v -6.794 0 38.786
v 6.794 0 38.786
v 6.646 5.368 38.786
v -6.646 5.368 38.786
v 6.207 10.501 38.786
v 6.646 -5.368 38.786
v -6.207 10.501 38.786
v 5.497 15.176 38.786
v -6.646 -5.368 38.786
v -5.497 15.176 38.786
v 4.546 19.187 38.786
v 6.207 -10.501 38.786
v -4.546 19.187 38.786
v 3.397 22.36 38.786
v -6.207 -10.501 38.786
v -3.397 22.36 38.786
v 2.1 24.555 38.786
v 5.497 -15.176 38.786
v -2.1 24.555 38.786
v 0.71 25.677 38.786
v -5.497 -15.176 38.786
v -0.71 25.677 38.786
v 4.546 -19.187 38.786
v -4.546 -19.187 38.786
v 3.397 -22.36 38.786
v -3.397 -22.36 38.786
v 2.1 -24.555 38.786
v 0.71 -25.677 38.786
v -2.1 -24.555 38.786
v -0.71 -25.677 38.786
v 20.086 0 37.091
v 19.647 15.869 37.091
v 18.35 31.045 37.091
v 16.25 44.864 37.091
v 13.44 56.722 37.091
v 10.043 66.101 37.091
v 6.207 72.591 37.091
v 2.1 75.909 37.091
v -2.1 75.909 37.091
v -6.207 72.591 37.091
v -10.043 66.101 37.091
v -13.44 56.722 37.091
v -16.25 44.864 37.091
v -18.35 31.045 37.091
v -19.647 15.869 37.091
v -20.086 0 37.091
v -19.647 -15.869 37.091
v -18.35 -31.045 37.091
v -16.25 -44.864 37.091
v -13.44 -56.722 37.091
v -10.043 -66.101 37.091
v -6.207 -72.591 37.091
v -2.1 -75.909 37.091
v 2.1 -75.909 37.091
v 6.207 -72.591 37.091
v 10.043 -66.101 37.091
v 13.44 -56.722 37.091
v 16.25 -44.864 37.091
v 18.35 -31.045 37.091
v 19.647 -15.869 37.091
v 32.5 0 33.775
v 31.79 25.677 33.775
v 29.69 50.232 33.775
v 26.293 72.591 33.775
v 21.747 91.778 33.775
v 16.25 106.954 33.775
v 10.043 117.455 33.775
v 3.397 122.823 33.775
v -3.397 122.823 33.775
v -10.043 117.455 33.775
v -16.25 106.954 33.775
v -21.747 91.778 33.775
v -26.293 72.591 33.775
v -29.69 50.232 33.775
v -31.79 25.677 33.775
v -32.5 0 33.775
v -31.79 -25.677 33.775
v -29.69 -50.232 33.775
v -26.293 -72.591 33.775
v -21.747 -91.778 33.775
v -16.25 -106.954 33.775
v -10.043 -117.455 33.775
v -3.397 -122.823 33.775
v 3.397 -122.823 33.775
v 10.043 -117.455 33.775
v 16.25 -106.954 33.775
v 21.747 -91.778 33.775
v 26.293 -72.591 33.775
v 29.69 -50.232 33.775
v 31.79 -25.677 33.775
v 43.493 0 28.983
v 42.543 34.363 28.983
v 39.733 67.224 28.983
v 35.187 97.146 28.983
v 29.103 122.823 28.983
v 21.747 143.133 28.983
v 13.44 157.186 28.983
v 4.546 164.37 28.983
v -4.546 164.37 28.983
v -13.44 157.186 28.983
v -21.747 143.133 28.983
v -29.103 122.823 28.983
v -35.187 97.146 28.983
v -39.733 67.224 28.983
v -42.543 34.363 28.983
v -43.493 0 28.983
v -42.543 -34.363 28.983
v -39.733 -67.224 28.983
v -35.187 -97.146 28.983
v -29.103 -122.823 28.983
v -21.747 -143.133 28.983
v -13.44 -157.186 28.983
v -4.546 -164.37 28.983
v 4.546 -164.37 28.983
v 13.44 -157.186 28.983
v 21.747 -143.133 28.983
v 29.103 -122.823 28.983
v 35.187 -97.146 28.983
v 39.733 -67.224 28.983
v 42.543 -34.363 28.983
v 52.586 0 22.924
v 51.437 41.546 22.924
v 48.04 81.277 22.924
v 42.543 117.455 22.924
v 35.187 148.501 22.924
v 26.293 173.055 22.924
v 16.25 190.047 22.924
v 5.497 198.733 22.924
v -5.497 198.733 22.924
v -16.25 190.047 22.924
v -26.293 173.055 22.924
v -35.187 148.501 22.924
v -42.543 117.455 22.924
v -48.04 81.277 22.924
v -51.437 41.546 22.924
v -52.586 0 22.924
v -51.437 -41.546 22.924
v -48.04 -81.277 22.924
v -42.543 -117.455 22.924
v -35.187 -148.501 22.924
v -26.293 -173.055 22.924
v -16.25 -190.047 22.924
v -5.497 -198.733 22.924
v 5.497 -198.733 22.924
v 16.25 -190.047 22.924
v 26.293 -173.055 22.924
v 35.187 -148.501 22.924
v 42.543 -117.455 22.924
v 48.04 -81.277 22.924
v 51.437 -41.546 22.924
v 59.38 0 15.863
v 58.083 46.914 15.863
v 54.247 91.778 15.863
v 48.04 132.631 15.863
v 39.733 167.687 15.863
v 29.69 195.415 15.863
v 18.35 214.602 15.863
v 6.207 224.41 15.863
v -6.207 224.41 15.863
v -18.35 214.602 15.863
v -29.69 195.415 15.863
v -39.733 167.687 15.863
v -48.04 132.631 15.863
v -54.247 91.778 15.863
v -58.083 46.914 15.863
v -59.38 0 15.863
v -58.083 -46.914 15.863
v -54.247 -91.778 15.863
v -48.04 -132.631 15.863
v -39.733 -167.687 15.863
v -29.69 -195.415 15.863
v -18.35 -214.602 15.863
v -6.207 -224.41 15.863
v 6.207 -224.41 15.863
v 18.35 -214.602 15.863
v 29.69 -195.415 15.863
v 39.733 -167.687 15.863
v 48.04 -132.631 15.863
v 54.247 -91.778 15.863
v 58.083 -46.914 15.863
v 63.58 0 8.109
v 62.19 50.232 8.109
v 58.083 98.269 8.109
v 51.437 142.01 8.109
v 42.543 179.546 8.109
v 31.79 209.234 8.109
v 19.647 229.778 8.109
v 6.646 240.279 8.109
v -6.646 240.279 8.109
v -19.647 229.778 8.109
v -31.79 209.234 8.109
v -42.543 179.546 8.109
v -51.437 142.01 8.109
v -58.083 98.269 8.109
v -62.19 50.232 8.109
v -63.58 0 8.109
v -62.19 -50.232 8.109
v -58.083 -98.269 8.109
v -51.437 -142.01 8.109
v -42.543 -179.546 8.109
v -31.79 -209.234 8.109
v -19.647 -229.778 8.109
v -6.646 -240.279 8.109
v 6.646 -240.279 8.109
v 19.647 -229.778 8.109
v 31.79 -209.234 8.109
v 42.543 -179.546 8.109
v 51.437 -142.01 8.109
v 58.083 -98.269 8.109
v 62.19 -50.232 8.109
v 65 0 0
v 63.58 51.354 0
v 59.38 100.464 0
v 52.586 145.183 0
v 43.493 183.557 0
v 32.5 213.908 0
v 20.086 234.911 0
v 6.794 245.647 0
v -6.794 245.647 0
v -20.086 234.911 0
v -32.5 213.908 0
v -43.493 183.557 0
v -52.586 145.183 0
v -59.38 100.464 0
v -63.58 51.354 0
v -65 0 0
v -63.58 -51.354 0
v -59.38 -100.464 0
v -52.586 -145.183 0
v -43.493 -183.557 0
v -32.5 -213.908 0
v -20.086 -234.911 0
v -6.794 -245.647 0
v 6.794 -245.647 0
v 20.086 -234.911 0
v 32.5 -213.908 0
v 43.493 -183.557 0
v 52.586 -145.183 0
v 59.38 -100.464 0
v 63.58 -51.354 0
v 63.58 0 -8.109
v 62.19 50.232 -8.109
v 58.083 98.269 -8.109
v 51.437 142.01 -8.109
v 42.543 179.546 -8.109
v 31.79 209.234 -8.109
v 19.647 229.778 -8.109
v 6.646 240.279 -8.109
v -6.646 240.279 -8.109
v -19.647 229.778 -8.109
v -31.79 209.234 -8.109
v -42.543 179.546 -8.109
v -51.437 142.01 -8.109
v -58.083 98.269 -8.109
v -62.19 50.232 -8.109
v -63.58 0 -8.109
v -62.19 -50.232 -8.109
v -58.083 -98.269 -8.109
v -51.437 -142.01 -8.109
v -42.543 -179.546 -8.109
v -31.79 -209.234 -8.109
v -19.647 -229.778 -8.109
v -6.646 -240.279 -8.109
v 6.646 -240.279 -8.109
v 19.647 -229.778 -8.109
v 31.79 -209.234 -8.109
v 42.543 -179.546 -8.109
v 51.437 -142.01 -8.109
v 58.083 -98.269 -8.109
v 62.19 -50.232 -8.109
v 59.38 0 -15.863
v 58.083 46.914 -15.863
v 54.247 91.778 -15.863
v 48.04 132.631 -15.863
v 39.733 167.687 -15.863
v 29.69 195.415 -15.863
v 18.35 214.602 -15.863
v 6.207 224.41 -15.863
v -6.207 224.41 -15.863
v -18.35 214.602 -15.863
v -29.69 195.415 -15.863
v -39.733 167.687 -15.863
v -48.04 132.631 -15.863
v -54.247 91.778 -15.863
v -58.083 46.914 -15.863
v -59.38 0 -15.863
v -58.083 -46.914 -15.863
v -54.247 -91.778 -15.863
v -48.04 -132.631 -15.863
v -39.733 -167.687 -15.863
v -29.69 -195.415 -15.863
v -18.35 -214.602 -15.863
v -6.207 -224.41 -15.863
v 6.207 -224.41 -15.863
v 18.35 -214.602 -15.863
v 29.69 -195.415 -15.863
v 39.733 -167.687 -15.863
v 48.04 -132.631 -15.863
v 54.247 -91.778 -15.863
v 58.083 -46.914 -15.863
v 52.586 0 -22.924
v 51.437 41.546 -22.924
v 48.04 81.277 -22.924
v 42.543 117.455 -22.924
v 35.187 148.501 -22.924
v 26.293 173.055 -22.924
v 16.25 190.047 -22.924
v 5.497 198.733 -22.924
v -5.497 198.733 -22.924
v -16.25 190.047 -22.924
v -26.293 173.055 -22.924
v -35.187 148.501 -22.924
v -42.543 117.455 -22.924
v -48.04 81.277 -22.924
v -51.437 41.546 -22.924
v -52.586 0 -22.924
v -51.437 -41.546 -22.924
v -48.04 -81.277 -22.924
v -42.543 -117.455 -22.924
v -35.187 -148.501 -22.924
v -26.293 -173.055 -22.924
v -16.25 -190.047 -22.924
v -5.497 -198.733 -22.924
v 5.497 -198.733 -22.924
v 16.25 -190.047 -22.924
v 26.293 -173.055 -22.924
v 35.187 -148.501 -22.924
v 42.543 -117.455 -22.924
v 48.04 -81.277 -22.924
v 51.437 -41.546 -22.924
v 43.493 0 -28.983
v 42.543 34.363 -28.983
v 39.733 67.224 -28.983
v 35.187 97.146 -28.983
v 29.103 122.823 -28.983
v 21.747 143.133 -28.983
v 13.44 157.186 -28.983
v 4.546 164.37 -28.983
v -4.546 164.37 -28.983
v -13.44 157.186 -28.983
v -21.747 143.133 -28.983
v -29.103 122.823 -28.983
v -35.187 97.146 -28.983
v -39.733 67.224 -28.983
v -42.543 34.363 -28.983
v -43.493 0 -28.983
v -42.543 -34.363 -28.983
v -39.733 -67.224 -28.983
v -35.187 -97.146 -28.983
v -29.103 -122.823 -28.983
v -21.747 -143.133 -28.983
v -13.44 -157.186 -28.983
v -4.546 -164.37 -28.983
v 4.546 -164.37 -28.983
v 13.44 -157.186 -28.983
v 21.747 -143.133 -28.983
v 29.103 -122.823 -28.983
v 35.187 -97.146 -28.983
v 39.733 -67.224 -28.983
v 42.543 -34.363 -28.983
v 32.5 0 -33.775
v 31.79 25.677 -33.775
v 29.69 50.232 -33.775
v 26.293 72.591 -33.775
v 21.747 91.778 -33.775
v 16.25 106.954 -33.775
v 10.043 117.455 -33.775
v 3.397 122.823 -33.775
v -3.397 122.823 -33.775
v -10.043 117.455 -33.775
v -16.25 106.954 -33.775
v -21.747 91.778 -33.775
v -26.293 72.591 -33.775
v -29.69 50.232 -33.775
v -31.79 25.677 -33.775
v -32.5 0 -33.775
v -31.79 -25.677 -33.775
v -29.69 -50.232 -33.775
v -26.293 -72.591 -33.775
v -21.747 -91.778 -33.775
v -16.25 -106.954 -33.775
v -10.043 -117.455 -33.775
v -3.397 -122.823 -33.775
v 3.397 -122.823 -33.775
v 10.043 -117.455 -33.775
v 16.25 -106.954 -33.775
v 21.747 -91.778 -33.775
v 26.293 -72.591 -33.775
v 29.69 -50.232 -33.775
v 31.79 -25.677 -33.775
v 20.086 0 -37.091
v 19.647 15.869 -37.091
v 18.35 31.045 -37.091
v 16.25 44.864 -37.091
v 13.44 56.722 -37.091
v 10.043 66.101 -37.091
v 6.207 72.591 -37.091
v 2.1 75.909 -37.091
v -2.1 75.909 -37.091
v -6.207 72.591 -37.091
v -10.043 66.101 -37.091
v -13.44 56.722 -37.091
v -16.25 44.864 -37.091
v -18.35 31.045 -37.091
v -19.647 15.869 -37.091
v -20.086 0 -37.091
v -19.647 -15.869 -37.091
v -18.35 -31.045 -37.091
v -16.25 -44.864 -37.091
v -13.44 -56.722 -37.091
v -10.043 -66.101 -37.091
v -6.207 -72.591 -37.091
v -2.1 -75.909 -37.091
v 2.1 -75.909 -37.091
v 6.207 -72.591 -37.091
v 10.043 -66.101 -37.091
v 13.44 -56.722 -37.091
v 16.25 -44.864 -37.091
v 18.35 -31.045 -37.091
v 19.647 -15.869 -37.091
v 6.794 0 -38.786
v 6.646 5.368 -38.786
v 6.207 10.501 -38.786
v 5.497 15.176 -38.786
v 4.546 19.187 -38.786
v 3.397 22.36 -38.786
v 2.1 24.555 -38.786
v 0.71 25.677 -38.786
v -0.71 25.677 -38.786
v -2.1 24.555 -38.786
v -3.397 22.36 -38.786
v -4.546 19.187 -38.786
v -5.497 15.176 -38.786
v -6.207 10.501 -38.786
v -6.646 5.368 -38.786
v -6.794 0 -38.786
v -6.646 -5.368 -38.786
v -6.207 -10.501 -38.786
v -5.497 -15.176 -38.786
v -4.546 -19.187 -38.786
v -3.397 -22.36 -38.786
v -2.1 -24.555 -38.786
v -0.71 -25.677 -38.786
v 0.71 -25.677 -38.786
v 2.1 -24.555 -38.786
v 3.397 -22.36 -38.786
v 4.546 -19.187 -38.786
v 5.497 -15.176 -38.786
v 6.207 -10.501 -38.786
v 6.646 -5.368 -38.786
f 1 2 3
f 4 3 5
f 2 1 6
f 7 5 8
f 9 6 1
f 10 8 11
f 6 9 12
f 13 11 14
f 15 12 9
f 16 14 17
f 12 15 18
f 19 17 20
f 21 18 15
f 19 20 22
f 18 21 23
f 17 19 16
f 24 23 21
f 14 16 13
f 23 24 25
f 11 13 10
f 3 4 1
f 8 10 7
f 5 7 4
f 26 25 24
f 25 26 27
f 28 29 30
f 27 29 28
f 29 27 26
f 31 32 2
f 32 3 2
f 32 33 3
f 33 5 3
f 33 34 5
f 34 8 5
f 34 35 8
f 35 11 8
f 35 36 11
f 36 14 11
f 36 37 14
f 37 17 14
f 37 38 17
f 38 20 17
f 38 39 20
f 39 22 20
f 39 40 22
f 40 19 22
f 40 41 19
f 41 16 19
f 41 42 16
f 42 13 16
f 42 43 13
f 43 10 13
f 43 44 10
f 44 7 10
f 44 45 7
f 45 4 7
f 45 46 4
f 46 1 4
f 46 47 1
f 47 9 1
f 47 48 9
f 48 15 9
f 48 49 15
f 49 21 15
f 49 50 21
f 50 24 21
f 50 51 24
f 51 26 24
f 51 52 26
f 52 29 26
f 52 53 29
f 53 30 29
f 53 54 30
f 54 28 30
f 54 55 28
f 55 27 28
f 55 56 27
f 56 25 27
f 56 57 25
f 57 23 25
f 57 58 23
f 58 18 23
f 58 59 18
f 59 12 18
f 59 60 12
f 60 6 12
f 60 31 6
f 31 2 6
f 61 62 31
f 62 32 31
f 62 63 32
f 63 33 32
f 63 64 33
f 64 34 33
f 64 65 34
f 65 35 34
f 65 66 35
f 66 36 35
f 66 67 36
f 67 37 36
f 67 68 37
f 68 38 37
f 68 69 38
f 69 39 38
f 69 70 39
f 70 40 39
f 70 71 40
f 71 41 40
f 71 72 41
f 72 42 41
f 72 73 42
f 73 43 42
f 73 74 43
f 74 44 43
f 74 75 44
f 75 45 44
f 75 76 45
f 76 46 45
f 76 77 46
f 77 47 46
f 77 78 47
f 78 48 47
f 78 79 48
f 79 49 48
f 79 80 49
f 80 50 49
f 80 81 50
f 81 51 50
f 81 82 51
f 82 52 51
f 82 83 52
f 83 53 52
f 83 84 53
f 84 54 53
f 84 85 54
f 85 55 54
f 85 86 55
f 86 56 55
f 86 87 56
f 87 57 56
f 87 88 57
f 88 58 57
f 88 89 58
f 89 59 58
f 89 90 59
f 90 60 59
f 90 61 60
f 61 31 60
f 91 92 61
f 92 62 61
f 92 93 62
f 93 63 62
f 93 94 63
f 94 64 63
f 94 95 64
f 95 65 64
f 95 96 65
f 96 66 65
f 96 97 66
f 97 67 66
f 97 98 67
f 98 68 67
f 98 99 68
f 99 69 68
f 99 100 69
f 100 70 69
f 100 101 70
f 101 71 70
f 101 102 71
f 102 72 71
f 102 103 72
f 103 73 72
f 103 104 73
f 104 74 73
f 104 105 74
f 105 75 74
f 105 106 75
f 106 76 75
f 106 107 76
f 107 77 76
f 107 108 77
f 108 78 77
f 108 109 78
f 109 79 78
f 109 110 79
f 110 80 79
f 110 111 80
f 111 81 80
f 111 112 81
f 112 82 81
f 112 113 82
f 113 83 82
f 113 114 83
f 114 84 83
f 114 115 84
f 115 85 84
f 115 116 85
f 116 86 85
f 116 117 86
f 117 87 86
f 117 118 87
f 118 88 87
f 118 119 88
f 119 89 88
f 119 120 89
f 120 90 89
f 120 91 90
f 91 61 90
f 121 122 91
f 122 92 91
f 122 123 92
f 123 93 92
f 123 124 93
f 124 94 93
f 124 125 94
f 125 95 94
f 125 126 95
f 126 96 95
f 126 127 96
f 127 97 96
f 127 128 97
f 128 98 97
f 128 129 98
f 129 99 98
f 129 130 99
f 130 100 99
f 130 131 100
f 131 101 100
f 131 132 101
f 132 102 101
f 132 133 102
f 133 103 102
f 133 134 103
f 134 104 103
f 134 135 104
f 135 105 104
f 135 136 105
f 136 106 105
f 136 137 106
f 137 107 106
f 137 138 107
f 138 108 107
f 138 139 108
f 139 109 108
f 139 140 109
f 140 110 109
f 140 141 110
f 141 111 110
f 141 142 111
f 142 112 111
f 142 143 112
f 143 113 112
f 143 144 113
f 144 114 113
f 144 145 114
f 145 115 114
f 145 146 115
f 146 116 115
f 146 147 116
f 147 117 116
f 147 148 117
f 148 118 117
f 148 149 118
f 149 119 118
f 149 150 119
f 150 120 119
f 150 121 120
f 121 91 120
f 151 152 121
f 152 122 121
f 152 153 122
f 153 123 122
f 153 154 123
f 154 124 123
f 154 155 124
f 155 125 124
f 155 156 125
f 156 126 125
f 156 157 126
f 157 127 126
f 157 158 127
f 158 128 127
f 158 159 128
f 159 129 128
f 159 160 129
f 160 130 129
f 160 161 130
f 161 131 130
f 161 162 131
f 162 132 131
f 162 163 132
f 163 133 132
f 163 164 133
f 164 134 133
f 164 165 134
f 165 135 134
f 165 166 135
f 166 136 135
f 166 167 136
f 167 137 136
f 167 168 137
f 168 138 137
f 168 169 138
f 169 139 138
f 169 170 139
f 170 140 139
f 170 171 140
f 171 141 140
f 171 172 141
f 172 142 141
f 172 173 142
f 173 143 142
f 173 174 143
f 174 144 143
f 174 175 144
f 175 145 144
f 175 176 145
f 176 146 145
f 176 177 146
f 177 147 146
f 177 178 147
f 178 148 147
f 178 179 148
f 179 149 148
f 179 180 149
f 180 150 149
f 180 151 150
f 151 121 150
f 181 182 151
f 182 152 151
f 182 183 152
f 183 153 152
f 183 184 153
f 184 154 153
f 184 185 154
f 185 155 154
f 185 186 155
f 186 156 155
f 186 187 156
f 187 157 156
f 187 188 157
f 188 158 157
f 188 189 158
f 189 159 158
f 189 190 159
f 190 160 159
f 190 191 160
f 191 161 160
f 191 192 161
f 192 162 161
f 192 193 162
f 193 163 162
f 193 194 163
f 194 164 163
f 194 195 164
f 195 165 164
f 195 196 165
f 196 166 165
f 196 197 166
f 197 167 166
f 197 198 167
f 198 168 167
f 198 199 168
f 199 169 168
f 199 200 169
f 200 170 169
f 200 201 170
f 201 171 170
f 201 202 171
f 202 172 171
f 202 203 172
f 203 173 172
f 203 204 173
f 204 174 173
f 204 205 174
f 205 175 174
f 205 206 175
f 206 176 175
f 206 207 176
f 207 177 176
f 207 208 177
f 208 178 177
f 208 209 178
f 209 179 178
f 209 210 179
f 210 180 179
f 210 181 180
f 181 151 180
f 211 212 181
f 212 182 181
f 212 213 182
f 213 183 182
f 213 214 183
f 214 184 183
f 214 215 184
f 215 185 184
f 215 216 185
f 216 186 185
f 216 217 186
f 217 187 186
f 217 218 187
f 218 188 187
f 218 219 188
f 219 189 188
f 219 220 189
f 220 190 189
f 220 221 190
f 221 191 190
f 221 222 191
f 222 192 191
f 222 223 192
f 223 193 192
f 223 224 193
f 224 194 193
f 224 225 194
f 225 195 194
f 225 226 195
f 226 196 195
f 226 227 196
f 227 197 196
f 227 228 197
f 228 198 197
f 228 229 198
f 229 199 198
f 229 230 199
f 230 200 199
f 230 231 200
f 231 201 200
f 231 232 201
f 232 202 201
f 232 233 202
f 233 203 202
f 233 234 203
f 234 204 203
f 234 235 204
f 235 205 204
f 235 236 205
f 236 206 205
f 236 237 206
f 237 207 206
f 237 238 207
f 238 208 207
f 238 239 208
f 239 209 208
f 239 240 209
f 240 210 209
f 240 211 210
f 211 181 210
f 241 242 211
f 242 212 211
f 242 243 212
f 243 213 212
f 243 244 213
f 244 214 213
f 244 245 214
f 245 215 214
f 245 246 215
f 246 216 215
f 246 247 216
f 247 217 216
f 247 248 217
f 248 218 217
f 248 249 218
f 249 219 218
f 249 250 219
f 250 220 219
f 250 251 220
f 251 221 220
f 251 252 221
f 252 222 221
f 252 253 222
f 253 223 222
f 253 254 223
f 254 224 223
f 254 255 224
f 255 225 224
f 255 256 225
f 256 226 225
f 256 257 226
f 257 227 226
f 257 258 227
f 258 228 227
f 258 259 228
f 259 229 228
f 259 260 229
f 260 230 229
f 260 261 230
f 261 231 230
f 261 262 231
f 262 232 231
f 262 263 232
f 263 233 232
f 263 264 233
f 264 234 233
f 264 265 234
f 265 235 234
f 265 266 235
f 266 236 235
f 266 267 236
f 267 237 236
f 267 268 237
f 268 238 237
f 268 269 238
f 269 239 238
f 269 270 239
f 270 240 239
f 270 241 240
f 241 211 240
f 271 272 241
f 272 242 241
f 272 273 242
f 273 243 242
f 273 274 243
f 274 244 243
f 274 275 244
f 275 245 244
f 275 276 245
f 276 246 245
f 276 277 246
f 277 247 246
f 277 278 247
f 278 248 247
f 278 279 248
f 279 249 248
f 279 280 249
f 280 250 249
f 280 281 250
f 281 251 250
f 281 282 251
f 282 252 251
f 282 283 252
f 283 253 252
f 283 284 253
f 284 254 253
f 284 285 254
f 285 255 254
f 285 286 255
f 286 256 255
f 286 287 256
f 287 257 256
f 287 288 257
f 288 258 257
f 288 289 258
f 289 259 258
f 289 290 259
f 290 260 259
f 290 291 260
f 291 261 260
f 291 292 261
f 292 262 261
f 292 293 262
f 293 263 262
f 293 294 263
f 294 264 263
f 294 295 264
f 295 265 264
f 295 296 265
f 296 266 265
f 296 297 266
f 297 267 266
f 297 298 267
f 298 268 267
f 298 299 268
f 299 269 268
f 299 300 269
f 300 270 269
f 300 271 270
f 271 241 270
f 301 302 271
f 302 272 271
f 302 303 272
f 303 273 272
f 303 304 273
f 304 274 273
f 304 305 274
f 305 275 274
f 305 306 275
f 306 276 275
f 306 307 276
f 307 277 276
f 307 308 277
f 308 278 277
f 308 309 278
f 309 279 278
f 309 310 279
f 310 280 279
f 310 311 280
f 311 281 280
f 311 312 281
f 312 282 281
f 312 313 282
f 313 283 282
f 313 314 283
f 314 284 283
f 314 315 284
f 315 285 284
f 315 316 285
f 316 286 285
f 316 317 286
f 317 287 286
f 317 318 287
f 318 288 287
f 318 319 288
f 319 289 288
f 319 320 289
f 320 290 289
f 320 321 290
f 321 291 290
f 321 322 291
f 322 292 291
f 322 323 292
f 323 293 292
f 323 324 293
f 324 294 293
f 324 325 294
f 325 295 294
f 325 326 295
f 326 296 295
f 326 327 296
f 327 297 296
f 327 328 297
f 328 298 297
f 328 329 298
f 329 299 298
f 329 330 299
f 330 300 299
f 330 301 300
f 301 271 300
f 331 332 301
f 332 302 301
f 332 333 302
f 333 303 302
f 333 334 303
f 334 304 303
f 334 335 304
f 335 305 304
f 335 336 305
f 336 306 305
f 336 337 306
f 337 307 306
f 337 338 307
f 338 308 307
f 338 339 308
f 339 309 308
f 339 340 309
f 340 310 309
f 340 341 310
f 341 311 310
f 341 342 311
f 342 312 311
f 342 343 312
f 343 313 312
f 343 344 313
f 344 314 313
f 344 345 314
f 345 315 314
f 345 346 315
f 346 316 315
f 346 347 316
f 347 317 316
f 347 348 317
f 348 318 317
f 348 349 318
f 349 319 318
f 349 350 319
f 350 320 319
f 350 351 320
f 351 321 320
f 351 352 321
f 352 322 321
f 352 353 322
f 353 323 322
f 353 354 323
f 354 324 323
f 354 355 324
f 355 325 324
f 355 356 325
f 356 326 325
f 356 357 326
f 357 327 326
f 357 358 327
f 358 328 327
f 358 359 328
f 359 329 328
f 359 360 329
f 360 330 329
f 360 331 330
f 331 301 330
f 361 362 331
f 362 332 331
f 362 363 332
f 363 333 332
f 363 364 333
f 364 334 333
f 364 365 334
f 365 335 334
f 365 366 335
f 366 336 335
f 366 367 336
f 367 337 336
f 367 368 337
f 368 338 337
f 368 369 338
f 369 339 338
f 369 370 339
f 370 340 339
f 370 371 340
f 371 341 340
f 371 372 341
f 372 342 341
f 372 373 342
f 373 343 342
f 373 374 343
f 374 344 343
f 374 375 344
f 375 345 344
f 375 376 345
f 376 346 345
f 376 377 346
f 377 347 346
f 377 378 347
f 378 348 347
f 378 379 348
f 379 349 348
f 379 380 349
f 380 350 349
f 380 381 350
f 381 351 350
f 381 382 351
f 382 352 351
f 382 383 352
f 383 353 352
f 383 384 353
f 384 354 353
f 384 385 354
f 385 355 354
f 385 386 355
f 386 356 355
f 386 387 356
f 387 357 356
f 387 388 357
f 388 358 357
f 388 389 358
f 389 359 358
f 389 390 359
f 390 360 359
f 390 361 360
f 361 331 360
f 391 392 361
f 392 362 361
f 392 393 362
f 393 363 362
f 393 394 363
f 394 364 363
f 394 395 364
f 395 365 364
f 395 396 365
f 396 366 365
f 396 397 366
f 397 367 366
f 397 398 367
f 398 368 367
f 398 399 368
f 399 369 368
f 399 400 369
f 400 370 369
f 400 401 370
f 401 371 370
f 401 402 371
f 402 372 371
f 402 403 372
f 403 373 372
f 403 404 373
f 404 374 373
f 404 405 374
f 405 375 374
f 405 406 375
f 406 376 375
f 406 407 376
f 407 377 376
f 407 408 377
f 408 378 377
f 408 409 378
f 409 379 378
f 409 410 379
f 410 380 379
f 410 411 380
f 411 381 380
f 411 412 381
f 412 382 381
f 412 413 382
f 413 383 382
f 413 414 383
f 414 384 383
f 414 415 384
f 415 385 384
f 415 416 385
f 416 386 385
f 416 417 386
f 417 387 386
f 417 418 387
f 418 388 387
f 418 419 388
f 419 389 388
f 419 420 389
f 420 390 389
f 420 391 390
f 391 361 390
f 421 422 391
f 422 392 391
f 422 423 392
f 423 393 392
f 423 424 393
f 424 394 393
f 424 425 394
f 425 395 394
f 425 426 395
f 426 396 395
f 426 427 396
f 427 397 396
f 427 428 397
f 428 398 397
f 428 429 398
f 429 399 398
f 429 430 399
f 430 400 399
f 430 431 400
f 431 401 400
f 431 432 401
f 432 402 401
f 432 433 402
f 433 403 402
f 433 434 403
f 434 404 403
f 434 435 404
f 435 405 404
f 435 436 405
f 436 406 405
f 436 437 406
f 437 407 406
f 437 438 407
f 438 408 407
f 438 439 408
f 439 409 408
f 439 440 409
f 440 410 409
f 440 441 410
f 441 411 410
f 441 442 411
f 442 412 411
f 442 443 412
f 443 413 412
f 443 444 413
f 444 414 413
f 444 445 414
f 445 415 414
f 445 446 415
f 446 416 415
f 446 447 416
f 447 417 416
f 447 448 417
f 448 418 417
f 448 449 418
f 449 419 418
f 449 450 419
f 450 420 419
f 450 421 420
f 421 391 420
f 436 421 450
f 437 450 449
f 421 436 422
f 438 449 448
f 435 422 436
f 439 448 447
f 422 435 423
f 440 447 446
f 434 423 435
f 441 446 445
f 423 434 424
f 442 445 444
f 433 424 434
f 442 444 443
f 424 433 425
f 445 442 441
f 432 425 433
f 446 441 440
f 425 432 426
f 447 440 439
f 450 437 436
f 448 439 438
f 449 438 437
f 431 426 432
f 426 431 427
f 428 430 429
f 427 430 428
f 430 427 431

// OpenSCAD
// Generated by SolidPython 1.0.1 on 2020-07-29 00:46:47


scale(v = [5, 19, 3]) {
	sphere(r = 13);
}
/***********************************************
*********      SolidPython code:      **********
************************************************
 
# import packages: SolidPython
from solid import *
from solid.utils import *
from itertools import chain, combinations, permutations


class Resize:

    def __init__(self, scad_file):
        self.scad_file = scad_file
        #self.scad_file = import_scad(scad_file)
        # cone/cylinder param:
        self.r1 = 0
        self.r2 = 0
        self.h = 0
        # rectangular prism param:
        self.w = 0
        self.l = 0
        # ellipse param:
        self.r = 0

    # import OpenScad code (file name corresponds to shape)


    # classify shape + parameters
    def assign(self, param1, param2, param3):
        if self.scad_file == 'cone.scad':
            self.r1 = param1
            self.r2 = param2
            self.h = param3
        elif self.scad_file == 'cylinder.scad':
            self.r1 = param1
            self.r2 = param2
            self.h = param3
        elif self.scad_file == 'rectangularPrism.scad':
            self.h = param1
            self.l = param2
            self.w = param3
        else:
            self.r = param1
            self.h = param2

    # resize parameters
    def iterate(self):
        x = range(3, 20, 2)
        i = 1
        if self.scad_file == 'cone.scad':
            tempList = list(permutations(x, 2))
            for temp in tempList:
                param1 = temp[0]
                param2 = temp[1]
                filepath = 'produced_scad_files/' + 'cone' + str(param1) + '_' + str(param2) + '_' + '.scad'
                scad_render_to_file(cylinder(h=param1, r1=param2, r2=0), filepath)

        elif self.scad_file == 'cylinder.scad':
            tempList = list(permutations(x, 3))
            for temp in tempList:
                param1 = temp[0]
                param2 = temp[1]
                filepath = 'produced_scad_files/' + 'cylinder' + str(param1) + '_' + str(param2) + '_' + '.scad'
                scad_render_to_file(cylinder(h=param1, r1=param2, r2=param2), filepath)

        elif self.scad_file == 'rectangularPrism.scad':
            tempList = list(permutations(x, 3))
            for temp in tempList:
                param1 = temp[0]
                param2 = temp[1]
                param3 = temp[2]
                filepath = 'produced_scad_files/' + 'rectangularPrism' + str(param1) + '_' + str(param2) + '_' + str(
                    param3) + '.scad'
                scad_render_to_file(cube(size=(param1, param2, param3)), filepath)

        elif self.scad_file == 'ellipse.scad':
            tempList = list(permutations(x, 4))
            for temp in tempList:
                param1 = temp[0]
                param2 = temp[1]
                param3 = temp[2]
                param4 = temp[3]
                filepath = 'produced_scad_files/' + 'ellipse' + str(param1) + '_' + str(param2) + '_' + str(param3) + '_' + str(param4) + '.scad'
                scad_render_to_file(scale([param1, param2, param3])(sphere(r=param4)), filepath)

    def render_to_scadfile(self):
        scad_render_to_file(scad, 'example.scad') 
 
************************************************/
